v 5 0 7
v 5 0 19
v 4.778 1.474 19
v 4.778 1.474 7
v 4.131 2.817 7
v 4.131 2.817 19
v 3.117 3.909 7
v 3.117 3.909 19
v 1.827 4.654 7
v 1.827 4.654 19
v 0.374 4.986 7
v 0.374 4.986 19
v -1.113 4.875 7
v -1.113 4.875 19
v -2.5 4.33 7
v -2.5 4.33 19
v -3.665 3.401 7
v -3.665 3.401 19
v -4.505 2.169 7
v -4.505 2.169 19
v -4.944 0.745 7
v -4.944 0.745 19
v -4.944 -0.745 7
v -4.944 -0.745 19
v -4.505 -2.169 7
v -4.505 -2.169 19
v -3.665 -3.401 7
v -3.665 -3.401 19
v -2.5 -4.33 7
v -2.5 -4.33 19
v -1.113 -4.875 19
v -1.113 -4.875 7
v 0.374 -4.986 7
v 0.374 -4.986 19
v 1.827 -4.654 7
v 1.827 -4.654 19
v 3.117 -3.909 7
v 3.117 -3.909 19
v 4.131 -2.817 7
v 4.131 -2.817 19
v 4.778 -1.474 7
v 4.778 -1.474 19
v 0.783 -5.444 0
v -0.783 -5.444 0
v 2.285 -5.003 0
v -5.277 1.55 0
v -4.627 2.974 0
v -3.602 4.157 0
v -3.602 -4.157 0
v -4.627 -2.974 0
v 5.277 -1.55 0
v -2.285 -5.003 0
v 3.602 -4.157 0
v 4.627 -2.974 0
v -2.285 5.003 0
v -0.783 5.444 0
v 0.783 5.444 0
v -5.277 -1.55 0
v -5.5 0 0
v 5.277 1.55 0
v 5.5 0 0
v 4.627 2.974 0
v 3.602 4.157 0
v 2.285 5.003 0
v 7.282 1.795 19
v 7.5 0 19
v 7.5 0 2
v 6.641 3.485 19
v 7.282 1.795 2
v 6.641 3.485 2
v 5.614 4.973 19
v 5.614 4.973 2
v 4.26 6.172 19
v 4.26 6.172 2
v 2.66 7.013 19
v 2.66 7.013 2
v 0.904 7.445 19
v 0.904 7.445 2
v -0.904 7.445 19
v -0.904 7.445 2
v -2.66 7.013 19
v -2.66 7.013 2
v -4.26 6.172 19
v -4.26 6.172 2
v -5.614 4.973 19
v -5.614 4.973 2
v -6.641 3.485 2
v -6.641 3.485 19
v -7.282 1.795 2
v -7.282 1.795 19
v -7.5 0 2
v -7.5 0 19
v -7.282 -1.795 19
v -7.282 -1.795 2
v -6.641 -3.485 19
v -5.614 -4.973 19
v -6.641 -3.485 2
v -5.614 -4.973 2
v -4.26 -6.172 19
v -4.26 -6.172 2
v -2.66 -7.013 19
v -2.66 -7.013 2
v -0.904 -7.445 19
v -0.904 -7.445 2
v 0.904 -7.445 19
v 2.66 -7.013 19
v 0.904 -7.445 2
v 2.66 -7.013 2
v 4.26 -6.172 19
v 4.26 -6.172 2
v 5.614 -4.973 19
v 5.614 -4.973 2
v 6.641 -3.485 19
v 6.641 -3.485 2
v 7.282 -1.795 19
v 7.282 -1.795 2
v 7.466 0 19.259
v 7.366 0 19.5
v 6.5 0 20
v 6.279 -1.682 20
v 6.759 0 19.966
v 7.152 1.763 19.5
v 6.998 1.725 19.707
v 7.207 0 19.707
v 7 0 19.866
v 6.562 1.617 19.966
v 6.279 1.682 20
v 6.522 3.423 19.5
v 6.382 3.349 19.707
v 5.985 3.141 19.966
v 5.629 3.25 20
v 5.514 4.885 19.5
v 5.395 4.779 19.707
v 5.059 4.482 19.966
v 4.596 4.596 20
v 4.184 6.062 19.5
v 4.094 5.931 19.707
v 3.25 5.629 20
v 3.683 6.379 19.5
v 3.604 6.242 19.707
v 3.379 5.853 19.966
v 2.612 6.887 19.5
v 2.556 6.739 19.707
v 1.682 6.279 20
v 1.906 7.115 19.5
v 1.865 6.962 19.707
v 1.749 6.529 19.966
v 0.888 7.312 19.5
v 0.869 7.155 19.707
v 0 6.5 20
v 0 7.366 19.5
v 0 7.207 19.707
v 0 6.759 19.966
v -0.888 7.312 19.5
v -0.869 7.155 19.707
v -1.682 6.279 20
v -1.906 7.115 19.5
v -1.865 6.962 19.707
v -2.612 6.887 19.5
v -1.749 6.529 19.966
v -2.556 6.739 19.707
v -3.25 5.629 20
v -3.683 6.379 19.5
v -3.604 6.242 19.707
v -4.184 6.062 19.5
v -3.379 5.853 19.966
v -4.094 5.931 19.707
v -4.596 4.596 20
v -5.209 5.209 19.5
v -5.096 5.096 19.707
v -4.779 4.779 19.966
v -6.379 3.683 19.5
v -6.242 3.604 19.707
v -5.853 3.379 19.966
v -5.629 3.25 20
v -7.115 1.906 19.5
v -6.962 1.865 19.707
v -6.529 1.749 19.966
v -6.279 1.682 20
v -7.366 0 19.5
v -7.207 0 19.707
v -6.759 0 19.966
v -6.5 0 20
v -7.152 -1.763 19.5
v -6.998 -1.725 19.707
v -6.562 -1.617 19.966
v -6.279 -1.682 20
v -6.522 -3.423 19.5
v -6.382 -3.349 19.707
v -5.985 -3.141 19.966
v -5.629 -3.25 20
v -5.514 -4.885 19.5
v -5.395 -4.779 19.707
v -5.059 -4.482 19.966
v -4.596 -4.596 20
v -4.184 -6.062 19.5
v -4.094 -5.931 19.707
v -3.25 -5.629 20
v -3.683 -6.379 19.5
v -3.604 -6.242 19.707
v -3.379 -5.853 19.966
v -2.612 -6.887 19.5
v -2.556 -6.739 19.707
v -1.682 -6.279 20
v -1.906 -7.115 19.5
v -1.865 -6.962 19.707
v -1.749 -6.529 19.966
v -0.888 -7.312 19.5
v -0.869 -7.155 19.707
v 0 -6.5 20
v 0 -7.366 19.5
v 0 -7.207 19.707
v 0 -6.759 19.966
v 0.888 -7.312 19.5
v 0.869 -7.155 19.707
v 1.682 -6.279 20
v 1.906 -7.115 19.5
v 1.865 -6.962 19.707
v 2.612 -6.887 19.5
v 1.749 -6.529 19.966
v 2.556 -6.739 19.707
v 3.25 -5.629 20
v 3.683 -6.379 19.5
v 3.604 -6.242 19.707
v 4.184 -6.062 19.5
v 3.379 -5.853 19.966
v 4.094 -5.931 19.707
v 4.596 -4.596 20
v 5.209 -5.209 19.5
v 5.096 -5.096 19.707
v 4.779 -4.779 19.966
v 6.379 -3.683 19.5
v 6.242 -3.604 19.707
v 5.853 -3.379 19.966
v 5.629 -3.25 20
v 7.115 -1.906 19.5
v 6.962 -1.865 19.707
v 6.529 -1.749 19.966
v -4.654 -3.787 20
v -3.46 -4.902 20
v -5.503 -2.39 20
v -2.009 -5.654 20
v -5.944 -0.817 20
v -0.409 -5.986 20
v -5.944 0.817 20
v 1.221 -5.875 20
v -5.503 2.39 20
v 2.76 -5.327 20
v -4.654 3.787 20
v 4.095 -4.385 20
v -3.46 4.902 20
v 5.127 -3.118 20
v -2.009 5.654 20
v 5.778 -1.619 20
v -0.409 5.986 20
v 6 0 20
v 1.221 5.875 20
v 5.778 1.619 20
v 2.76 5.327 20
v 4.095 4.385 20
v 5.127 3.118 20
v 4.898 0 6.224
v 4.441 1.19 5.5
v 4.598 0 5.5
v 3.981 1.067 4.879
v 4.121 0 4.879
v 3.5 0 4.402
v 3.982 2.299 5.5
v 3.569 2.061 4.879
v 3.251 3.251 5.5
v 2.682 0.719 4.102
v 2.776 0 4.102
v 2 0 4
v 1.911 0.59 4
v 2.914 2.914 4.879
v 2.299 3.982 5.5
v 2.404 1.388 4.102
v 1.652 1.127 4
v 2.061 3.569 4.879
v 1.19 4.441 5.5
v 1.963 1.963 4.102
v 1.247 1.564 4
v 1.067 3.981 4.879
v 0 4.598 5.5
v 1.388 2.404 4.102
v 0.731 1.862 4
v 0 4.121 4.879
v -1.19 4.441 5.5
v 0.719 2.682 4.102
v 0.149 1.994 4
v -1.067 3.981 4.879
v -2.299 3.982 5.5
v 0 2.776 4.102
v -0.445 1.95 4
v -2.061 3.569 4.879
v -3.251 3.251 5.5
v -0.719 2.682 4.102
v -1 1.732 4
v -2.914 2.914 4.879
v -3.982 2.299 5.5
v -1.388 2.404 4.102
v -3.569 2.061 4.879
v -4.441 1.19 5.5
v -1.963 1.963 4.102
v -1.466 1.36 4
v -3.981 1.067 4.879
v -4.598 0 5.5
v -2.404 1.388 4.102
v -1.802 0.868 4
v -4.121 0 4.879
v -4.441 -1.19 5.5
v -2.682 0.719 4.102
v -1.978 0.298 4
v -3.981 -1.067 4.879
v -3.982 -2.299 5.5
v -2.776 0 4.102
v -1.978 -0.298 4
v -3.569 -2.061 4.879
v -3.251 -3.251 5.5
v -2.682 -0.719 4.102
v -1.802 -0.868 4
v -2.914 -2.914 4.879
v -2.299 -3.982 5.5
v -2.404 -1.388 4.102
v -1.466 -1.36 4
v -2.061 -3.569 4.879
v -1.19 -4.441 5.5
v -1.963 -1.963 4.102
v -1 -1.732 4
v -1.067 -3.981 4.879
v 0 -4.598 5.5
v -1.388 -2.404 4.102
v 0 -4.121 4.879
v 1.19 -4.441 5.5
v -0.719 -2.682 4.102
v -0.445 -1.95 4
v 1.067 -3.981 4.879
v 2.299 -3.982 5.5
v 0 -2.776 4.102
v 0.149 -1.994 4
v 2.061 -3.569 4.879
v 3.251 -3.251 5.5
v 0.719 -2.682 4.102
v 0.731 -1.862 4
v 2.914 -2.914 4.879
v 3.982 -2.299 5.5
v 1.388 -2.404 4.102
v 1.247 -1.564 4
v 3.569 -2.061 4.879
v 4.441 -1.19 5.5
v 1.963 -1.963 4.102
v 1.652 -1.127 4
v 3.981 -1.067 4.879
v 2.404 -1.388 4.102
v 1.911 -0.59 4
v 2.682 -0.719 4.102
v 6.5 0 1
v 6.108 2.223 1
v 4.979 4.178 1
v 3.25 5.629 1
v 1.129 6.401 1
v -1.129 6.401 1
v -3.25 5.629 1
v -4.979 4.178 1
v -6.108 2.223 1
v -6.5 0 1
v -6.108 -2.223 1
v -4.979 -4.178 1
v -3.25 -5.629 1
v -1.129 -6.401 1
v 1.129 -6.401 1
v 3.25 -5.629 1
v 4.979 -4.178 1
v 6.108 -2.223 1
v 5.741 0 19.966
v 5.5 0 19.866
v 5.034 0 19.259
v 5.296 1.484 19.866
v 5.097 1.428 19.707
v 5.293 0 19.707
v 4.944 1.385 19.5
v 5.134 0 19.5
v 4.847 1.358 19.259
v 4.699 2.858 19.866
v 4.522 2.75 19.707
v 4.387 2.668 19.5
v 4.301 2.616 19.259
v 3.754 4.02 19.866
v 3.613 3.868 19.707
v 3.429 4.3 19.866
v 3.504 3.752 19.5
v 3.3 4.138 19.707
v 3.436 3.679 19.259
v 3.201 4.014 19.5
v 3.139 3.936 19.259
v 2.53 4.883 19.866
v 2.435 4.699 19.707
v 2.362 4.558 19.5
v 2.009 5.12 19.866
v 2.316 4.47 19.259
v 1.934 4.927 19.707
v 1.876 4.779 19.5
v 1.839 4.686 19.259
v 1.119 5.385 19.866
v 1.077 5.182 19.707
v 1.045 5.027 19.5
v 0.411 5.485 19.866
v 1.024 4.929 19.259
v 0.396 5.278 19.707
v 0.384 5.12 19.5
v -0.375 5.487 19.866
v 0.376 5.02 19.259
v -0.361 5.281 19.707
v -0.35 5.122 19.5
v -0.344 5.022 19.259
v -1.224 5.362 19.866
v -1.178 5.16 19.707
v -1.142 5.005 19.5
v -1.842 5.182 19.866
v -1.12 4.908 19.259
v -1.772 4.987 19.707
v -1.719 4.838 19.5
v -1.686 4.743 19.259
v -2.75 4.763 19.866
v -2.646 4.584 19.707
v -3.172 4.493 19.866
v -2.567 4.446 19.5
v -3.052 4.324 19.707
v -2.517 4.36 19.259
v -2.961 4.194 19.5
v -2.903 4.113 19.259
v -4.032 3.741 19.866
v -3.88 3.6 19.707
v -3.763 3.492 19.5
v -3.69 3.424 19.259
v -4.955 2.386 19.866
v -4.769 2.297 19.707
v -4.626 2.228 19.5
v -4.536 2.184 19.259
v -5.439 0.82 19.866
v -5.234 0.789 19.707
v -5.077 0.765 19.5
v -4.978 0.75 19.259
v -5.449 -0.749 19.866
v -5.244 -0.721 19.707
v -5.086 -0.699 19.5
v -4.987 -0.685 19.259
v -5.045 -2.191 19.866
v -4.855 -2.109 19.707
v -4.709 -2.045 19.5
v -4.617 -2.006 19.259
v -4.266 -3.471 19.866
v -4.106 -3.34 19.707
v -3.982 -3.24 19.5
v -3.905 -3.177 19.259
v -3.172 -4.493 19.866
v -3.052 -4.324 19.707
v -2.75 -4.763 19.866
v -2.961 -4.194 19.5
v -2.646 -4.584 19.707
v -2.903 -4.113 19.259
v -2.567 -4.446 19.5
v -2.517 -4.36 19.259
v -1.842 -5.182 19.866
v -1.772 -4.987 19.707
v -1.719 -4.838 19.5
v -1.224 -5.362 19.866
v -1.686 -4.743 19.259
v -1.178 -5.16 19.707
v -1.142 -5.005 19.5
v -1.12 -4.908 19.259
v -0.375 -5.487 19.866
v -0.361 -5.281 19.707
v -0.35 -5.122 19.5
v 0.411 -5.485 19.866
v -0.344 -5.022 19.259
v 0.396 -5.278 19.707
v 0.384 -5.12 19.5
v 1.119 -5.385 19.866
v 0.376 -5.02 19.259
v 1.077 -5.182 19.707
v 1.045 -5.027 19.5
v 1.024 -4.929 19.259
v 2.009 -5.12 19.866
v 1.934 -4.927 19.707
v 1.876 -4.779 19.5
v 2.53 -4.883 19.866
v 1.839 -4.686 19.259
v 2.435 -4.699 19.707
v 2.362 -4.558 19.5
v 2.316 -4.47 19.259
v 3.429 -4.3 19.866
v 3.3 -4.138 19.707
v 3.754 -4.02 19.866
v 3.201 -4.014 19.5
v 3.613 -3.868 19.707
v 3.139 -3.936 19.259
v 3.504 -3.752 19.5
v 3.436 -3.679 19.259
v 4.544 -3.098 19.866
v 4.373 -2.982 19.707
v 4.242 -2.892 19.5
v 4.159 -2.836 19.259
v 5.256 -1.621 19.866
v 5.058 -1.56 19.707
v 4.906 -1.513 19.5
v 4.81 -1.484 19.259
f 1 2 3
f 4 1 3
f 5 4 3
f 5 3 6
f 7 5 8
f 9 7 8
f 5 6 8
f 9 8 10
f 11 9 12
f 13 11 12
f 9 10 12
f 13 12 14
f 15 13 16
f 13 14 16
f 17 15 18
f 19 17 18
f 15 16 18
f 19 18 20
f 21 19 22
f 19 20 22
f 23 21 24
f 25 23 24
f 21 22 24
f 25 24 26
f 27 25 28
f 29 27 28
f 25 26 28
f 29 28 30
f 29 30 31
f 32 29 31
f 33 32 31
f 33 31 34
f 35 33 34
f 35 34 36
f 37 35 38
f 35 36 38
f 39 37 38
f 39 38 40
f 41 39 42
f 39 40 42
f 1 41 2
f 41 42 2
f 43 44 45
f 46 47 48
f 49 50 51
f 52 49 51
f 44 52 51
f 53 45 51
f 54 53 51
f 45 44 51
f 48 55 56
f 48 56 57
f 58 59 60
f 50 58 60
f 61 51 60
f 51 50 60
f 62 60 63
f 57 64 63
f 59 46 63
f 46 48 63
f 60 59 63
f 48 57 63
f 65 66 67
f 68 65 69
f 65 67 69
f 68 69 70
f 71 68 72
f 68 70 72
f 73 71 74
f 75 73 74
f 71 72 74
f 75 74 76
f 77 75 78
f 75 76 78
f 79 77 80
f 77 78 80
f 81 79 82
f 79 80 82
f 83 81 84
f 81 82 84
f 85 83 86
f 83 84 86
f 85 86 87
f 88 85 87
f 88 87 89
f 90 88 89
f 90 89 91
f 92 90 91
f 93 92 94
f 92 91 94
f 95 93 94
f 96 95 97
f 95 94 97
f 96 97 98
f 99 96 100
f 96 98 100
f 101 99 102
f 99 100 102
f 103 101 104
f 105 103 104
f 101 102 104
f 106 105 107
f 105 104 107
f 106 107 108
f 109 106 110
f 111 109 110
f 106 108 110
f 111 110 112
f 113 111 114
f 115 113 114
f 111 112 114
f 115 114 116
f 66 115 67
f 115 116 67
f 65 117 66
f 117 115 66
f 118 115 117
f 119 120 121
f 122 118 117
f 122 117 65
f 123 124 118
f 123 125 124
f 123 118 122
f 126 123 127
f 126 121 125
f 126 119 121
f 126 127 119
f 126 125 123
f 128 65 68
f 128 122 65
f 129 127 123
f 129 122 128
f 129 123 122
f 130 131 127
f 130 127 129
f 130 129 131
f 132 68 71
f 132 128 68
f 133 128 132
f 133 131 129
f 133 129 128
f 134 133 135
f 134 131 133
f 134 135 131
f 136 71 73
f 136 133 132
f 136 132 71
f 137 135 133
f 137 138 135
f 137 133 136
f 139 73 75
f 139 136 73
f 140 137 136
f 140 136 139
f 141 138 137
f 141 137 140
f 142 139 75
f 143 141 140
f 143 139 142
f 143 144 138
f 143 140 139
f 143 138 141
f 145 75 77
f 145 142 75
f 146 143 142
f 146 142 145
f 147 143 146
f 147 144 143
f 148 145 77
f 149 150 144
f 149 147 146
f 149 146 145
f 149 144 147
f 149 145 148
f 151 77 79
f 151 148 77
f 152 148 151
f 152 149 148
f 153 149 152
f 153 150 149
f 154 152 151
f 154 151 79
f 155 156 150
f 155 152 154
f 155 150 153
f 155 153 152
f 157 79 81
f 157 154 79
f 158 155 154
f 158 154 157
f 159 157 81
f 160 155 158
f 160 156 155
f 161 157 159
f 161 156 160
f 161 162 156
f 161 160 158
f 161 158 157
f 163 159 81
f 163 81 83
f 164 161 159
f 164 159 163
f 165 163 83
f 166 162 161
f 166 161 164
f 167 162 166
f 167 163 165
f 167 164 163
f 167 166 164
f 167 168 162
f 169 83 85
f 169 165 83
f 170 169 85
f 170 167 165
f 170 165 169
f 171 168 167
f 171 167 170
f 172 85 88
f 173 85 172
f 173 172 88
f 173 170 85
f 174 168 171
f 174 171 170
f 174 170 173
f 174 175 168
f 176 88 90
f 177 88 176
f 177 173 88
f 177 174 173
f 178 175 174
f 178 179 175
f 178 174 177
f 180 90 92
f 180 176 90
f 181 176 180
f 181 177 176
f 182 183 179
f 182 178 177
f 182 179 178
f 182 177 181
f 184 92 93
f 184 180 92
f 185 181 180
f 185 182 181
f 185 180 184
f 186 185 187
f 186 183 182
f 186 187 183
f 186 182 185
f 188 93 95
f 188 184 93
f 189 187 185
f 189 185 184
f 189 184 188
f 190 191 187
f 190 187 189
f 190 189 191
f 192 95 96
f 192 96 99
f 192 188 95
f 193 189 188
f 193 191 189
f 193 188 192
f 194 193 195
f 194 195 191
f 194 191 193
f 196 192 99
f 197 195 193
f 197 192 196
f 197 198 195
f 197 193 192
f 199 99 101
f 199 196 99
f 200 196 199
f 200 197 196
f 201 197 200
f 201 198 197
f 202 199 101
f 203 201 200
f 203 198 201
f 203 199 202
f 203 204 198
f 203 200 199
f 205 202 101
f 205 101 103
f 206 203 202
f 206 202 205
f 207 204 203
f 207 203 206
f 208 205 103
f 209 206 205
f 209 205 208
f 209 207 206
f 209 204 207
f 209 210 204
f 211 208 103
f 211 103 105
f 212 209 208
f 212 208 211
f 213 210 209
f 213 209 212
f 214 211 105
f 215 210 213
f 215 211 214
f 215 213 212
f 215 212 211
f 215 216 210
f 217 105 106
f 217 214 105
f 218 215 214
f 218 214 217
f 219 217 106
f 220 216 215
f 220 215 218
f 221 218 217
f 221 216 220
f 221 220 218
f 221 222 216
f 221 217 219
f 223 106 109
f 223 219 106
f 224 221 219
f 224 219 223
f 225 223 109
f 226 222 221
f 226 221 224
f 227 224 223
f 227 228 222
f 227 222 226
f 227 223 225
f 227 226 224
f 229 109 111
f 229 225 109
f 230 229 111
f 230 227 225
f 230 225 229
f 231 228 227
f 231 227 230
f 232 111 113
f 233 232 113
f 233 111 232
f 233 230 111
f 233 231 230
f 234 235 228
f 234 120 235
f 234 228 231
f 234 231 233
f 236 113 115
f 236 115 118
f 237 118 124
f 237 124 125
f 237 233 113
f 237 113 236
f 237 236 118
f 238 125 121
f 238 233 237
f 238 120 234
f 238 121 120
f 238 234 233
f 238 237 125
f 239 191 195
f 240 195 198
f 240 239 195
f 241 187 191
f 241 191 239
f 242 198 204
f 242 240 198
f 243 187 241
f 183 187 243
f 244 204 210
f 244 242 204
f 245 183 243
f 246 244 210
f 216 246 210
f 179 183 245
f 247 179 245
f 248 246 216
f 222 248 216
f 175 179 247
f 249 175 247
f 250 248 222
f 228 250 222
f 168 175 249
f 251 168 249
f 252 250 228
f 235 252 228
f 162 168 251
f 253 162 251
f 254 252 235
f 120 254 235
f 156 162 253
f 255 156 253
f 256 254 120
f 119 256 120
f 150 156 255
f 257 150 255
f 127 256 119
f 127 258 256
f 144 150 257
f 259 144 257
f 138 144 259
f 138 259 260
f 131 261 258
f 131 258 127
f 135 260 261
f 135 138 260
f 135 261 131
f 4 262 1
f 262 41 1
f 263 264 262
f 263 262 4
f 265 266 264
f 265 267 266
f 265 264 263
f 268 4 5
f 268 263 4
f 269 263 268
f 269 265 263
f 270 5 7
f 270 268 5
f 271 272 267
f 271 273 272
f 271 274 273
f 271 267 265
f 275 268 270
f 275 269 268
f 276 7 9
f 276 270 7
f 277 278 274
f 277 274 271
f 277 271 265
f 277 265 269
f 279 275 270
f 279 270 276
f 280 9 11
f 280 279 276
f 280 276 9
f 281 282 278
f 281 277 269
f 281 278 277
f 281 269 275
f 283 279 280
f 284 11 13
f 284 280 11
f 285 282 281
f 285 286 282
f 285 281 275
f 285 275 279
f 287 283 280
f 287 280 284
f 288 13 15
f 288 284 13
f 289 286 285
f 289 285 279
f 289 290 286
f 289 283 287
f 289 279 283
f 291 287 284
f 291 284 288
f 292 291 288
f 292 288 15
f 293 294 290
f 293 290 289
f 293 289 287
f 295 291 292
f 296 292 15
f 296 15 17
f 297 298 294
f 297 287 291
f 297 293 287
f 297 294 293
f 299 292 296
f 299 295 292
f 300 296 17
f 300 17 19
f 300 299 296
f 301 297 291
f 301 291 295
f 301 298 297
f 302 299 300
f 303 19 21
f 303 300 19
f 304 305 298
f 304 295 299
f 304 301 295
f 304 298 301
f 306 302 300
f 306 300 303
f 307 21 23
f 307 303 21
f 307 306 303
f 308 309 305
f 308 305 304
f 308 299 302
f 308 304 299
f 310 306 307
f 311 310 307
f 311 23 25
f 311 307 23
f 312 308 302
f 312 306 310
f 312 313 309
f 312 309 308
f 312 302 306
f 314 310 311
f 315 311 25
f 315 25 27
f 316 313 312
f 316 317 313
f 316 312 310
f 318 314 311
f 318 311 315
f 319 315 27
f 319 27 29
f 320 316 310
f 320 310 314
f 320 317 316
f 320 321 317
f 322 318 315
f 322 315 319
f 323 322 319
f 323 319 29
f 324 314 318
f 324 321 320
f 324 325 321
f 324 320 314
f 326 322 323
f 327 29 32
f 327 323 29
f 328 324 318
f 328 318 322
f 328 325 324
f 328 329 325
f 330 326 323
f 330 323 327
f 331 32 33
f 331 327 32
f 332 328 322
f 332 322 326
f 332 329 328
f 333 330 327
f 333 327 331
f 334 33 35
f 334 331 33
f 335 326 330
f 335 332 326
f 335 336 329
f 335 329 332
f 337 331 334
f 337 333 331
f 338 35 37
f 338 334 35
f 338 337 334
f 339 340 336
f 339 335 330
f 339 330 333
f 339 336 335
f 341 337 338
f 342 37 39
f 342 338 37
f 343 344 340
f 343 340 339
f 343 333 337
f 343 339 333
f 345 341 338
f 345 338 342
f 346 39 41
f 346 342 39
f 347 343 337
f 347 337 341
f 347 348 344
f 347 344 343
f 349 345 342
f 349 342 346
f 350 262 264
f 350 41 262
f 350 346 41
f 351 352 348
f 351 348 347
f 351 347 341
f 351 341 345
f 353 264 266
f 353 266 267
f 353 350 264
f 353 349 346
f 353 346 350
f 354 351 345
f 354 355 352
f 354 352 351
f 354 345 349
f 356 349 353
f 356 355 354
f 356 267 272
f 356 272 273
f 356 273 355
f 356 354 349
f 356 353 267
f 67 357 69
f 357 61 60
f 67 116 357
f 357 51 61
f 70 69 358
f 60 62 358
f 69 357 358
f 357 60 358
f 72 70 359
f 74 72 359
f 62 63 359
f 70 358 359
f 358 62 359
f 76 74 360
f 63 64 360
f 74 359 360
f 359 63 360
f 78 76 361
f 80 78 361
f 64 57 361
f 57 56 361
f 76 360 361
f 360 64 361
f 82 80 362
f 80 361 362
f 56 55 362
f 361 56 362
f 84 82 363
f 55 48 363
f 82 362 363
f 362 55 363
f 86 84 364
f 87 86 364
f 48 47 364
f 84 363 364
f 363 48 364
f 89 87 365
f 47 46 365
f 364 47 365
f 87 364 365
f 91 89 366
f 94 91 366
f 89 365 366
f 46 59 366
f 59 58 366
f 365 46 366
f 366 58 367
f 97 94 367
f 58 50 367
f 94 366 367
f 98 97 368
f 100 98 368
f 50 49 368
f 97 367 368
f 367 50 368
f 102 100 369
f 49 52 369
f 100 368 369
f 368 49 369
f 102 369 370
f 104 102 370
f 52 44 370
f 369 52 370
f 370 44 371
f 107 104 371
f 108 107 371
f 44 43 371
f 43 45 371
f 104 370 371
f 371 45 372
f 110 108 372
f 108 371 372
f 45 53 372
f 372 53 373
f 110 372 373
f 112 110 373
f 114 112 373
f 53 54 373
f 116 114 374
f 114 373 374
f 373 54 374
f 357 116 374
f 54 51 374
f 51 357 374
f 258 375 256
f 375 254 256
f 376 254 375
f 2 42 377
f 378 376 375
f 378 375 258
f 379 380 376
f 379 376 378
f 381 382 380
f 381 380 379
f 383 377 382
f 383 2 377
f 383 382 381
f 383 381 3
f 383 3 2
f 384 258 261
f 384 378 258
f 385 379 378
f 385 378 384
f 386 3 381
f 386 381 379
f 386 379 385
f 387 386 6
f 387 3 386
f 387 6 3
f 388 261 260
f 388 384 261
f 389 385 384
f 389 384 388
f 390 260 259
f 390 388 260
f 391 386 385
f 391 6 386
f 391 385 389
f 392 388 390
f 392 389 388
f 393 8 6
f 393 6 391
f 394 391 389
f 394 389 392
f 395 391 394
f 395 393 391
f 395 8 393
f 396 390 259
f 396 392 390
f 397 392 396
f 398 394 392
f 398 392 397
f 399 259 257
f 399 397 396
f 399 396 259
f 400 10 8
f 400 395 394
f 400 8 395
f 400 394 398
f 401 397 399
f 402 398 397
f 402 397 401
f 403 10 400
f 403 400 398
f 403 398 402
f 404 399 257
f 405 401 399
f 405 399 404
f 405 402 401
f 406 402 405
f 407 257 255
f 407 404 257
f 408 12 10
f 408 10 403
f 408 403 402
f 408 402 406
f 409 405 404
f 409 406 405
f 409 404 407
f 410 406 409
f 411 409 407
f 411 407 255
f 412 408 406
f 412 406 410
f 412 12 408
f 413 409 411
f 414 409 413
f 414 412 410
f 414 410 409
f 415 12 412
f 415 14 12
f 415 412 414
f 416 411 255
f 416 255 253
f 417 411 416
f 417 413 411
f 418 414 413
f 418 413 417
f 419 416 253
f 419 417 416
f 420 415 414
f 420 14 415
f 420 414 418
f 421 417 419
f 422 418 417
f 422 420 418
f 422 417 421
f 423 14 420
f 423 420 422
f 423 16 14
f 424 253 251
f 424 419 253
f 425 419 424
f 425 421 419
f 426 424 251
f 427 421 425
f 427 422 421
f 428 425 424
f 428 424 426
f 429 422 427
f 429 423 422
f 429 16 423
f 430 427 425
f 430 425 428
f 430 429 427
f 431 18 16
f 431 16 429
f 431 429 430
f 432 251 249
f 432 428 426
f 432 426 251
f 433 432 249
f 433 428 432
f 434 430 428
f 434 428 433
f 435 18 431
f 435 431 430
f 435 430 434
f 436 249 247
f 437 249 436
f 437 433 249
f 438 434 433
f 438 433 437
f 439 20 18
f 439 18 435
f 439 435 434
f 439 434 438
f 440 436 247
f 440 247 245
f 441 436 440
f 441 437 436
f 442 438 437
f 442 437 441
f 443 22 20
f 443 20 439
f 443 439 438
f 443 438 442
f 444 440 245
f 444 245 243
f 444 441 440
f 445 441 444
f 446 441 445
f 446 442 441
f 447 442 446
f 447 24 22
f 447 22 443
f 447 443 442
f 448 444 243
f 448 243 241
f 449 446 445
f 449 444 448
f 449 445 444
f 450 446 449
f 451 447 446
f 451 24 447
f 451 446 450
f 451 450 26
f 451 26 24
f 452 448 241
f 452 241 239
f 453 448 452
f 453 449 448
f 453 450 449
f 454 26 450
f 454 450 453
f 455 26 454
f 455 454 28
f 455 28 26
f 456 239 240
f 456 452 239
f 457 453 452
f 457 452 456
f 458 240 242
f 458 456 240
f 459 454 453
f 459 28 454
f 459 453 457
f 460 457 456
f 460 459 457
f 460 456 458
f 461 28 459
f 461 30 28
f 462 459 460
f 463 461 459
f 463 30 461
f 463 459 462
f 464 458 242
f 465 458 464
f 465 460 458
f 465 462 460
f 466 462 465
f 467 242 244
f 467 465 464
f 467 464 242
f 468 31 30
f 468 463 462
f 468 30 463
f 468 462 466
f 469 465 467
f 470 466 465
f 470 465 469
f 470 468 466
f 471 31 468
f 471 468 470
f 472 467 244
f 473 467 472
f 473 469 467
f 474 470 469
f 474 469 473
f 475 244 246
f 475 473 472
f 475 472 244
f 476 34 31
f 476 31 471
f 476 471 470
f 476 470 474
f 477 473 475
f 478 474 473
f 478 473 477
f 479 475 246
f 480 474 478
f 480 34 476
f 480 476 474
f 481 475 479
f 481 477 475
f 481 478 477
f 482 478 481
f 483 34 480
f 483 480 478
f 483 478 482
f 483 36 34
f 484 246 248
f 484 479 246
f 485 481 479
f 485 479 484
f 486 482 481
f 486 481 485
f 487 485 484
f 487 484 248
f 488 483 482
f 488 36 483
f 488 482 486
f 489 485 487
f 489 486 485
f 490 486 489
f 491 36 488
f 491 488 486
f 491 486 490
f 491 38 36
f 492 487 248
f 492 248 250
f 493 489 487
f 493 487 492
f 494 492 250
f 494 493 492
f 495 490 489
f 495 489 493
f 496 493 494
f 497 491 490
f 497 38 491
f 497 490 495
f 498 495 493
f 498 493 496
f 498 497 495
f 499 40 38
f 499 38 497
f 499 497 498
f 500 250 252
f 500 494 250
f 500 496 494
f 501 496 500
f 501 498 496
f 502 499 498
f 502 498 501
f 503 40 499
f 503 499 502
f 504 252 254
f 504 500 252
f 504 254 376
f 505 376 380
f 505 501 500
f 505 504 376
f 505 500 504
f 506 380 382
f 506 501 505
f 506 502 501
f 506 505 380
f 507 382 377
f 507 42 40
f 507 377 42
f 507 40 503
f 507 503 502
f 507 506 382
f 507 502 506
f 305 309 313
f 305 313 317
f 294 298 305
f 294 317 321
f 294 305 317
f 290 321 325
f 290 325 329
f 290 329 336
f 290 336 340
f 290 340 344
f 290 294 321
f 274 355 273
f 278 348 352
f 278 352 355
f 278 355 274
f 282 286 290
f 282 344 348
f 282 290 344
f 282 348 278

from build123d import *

# Parameters (mm, degrees)
F0_R     = 7.5
F1_DEPTH = 20
F2_R     = 5
F3_DEPTH = 16
F4_SIZE  = 2
F5_R     = 1
F6_R     = 3


with BuildPart() as f1:
    # F0 (on Top) → F1 (new body)
    with BuildSketch(Plane.XY):
        Circle(F0_R)
    extrude(amount=F1_DEPTH)

    # F2 (on face) → F3 (cut)
    with BuildSketch(Plane.XY.offset(20)):
        Circle(F2_R)
    extrude(amount=-F3_DEPTH, mode=Mode.SUBTRACT)

    # F4
    f4_edges = [f1.edges().sort_by_distance(p)[0] for p in [
        (-7.5, 0, 0),
    ]]
    chamfer(f4_edges, length=F4_SIZE)

    # F5
    f5_edges = [f1.edges().sort_by_distance(p)[0] for p in [
        (-7.5, 0, 20),
        (-5, 0, 20),
    ]]
    fillet(f5_edges, radius=F5_R)

    # F6
    f6_edges = [f1.edges().sort_by_distance(p)[0] for p in [
        (-5, 0, 4),
    ]]
    fillet(f6_edges, radius=F6_R)


solid = f1.part
